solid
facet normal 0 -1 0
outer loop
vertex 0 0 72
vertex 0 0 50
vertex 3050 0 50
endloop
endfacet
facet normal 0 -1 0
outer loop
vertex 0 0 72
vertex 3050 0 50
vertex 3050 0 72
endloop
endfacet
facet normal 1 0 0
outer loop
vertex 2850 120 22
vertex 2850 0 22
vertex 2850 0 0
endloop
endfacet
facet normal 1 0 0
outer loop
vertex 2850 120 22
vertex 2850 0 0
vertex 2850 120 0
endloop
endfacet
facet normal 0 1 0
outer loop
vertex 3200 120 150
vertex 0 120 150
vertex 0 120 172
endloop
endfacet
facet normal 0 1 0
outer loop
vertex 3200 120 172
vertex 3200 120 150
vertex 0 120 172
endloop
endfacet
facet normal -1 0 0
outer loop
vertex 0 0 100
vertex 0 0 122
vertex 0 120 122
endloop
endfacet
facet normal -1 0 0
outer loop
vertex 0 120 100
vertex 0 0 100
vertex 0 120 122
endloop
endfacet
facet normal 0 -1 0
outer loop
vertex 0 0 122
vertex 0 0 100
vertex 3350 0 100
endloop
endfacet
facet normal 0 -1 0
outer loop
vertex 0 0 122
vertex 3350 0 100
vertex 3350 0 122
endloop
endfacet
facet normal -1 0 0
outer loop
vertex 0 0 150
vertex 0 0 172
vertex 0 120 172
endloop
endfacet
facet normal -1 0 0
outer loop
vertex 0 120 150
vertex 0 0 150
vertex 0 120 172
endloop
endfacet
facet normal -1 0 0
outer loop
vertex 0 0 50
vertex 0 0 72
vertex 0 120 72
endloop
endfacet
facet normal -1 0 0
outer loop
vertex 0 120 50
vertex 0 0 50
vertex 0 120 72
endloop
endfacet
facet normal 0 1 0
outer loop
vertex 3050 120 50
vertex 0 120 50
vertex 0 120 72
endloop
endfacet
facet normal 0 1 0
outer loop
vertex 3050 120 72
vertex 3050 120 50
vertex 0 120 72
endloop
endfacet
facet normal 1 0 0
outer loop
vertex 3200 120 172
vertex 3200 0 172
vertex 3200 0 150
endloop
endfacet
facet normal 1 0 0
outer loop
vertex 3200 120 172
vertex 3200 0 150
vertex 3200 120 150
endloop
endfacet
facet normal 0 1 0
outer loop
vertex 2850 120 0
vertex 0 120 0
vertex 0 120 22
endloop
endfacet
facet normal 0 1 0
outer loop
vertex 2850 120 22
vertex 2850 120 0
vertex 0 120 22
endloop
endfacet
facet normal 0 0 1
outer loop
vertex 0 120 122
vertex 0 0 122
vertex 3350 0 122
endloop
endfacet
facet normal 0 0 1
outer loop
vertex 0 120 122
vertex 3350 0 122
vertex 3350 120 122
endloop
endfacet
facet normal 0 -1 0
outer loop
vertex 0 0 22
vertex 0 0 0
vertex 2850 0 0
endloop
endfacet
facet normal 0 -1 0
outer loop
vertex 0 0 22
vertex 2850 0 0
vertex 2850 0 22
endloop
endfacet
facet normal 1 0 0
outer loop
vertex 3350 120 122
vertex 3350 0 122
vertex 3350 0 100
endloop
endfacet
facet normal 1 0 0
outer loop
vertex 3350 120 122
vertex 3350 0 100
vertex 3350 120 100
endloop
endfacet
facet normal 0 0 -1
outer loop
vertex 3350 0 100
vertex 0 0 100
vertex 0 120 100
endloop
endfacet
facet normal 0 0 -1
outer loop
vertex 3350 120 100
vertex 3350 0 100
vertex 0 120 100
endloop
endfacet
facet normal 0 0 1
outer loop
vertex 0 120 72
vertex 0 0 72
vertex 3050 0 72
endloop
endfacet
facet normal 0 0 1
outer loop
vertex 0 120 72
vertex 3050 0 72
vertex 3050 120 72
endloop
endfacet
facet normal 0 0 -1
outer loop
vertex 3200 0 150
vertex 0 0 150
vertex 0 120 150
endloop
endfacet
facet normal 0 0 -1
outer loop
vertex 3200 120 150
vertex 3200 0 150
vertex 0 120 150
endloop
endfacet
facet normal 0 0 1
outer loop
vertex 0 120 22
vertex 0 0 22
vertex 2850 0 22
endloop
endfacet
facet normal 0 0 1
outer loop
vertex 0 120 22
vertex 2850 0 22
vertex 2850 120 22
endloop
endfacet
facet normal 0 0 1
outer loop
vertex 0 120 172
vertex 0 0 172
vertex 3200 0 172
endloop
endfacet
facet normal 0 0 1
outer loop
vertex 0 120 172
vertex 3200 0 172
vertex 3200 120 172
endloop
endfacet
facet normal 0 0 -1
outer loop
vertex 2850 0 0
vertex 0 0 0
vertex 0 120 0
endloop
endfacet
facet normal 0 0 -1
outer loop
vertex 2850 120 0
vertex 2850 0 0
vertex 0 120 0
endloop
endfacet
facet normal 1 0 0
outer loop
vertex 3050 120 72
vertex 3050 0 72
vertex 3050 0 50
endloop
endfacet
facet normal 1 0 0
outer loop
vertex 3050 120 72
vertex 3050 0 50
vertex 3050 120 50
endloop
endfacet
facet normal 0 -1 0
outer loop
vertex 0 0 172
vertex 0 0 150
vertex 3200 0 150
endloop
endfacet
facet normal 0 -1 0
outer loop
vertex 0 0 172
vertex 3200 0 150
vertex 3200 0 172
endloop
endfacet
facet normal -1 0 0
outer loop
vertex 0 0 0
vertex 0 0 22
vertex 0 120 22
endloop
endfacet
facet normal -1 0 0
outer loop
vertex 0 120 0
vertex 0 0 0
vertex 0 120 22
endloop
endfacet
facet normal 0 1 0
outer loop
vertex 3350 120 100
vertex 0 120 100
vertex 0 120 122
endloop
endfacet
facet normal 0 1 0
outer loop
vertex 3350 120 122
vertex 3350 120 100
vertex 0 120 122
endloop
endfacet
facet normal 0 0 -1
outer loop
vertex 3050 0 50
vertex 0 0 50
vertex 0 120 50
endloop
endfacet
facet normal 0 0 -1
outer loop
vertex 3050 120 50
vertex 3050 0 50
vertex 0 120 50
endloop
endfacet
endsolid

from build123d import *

# Parameters (mm, degrees)
F0_W     = 120
F0_H     = 22
F1_DEPTH = 2850
F2_DEPTH = 3050
F3_DEPTH = 3350
F4_DEPTH = 3200


with BuildPart() as f1:
    # F0 (on Right) → F1 (new body)
    with BuildSketch(Plane.YZ):
        with Locations((60, 11)):
            Rectangle(F0_W, F0_H)
    extrude(amount=F1_DEPTH)


with BuildPart() as f2:
    # F0 (on Right) → F2 (new body)
    with BuildSketch(Plane.YZ):
        with Locations((60, 61)):
            Rectangle(F0_W, F0_H)
    extrude(amount=F2_DEPTH)


with BuildPart() as f3:
    # F0 (on Right) → F3 (new body)
    with BuildSketch(Plane.YZ):
        with Locations((60, 111)):
            Rectangle(F0_W, F0_H)
    extrude(amount=F3_DEPTH)


with BuildPart() as f4:
    # F0 (on Right) → F4 (new body)
    with BuildSketch(Plane.YZ):
        with Locations((60, 161)):
            Rectangle(F0_W, F0_H)
    extrude(amount=F4_DEPTH)


solid = Compound([f1.part, f2.part, f3.part, f4.part])
